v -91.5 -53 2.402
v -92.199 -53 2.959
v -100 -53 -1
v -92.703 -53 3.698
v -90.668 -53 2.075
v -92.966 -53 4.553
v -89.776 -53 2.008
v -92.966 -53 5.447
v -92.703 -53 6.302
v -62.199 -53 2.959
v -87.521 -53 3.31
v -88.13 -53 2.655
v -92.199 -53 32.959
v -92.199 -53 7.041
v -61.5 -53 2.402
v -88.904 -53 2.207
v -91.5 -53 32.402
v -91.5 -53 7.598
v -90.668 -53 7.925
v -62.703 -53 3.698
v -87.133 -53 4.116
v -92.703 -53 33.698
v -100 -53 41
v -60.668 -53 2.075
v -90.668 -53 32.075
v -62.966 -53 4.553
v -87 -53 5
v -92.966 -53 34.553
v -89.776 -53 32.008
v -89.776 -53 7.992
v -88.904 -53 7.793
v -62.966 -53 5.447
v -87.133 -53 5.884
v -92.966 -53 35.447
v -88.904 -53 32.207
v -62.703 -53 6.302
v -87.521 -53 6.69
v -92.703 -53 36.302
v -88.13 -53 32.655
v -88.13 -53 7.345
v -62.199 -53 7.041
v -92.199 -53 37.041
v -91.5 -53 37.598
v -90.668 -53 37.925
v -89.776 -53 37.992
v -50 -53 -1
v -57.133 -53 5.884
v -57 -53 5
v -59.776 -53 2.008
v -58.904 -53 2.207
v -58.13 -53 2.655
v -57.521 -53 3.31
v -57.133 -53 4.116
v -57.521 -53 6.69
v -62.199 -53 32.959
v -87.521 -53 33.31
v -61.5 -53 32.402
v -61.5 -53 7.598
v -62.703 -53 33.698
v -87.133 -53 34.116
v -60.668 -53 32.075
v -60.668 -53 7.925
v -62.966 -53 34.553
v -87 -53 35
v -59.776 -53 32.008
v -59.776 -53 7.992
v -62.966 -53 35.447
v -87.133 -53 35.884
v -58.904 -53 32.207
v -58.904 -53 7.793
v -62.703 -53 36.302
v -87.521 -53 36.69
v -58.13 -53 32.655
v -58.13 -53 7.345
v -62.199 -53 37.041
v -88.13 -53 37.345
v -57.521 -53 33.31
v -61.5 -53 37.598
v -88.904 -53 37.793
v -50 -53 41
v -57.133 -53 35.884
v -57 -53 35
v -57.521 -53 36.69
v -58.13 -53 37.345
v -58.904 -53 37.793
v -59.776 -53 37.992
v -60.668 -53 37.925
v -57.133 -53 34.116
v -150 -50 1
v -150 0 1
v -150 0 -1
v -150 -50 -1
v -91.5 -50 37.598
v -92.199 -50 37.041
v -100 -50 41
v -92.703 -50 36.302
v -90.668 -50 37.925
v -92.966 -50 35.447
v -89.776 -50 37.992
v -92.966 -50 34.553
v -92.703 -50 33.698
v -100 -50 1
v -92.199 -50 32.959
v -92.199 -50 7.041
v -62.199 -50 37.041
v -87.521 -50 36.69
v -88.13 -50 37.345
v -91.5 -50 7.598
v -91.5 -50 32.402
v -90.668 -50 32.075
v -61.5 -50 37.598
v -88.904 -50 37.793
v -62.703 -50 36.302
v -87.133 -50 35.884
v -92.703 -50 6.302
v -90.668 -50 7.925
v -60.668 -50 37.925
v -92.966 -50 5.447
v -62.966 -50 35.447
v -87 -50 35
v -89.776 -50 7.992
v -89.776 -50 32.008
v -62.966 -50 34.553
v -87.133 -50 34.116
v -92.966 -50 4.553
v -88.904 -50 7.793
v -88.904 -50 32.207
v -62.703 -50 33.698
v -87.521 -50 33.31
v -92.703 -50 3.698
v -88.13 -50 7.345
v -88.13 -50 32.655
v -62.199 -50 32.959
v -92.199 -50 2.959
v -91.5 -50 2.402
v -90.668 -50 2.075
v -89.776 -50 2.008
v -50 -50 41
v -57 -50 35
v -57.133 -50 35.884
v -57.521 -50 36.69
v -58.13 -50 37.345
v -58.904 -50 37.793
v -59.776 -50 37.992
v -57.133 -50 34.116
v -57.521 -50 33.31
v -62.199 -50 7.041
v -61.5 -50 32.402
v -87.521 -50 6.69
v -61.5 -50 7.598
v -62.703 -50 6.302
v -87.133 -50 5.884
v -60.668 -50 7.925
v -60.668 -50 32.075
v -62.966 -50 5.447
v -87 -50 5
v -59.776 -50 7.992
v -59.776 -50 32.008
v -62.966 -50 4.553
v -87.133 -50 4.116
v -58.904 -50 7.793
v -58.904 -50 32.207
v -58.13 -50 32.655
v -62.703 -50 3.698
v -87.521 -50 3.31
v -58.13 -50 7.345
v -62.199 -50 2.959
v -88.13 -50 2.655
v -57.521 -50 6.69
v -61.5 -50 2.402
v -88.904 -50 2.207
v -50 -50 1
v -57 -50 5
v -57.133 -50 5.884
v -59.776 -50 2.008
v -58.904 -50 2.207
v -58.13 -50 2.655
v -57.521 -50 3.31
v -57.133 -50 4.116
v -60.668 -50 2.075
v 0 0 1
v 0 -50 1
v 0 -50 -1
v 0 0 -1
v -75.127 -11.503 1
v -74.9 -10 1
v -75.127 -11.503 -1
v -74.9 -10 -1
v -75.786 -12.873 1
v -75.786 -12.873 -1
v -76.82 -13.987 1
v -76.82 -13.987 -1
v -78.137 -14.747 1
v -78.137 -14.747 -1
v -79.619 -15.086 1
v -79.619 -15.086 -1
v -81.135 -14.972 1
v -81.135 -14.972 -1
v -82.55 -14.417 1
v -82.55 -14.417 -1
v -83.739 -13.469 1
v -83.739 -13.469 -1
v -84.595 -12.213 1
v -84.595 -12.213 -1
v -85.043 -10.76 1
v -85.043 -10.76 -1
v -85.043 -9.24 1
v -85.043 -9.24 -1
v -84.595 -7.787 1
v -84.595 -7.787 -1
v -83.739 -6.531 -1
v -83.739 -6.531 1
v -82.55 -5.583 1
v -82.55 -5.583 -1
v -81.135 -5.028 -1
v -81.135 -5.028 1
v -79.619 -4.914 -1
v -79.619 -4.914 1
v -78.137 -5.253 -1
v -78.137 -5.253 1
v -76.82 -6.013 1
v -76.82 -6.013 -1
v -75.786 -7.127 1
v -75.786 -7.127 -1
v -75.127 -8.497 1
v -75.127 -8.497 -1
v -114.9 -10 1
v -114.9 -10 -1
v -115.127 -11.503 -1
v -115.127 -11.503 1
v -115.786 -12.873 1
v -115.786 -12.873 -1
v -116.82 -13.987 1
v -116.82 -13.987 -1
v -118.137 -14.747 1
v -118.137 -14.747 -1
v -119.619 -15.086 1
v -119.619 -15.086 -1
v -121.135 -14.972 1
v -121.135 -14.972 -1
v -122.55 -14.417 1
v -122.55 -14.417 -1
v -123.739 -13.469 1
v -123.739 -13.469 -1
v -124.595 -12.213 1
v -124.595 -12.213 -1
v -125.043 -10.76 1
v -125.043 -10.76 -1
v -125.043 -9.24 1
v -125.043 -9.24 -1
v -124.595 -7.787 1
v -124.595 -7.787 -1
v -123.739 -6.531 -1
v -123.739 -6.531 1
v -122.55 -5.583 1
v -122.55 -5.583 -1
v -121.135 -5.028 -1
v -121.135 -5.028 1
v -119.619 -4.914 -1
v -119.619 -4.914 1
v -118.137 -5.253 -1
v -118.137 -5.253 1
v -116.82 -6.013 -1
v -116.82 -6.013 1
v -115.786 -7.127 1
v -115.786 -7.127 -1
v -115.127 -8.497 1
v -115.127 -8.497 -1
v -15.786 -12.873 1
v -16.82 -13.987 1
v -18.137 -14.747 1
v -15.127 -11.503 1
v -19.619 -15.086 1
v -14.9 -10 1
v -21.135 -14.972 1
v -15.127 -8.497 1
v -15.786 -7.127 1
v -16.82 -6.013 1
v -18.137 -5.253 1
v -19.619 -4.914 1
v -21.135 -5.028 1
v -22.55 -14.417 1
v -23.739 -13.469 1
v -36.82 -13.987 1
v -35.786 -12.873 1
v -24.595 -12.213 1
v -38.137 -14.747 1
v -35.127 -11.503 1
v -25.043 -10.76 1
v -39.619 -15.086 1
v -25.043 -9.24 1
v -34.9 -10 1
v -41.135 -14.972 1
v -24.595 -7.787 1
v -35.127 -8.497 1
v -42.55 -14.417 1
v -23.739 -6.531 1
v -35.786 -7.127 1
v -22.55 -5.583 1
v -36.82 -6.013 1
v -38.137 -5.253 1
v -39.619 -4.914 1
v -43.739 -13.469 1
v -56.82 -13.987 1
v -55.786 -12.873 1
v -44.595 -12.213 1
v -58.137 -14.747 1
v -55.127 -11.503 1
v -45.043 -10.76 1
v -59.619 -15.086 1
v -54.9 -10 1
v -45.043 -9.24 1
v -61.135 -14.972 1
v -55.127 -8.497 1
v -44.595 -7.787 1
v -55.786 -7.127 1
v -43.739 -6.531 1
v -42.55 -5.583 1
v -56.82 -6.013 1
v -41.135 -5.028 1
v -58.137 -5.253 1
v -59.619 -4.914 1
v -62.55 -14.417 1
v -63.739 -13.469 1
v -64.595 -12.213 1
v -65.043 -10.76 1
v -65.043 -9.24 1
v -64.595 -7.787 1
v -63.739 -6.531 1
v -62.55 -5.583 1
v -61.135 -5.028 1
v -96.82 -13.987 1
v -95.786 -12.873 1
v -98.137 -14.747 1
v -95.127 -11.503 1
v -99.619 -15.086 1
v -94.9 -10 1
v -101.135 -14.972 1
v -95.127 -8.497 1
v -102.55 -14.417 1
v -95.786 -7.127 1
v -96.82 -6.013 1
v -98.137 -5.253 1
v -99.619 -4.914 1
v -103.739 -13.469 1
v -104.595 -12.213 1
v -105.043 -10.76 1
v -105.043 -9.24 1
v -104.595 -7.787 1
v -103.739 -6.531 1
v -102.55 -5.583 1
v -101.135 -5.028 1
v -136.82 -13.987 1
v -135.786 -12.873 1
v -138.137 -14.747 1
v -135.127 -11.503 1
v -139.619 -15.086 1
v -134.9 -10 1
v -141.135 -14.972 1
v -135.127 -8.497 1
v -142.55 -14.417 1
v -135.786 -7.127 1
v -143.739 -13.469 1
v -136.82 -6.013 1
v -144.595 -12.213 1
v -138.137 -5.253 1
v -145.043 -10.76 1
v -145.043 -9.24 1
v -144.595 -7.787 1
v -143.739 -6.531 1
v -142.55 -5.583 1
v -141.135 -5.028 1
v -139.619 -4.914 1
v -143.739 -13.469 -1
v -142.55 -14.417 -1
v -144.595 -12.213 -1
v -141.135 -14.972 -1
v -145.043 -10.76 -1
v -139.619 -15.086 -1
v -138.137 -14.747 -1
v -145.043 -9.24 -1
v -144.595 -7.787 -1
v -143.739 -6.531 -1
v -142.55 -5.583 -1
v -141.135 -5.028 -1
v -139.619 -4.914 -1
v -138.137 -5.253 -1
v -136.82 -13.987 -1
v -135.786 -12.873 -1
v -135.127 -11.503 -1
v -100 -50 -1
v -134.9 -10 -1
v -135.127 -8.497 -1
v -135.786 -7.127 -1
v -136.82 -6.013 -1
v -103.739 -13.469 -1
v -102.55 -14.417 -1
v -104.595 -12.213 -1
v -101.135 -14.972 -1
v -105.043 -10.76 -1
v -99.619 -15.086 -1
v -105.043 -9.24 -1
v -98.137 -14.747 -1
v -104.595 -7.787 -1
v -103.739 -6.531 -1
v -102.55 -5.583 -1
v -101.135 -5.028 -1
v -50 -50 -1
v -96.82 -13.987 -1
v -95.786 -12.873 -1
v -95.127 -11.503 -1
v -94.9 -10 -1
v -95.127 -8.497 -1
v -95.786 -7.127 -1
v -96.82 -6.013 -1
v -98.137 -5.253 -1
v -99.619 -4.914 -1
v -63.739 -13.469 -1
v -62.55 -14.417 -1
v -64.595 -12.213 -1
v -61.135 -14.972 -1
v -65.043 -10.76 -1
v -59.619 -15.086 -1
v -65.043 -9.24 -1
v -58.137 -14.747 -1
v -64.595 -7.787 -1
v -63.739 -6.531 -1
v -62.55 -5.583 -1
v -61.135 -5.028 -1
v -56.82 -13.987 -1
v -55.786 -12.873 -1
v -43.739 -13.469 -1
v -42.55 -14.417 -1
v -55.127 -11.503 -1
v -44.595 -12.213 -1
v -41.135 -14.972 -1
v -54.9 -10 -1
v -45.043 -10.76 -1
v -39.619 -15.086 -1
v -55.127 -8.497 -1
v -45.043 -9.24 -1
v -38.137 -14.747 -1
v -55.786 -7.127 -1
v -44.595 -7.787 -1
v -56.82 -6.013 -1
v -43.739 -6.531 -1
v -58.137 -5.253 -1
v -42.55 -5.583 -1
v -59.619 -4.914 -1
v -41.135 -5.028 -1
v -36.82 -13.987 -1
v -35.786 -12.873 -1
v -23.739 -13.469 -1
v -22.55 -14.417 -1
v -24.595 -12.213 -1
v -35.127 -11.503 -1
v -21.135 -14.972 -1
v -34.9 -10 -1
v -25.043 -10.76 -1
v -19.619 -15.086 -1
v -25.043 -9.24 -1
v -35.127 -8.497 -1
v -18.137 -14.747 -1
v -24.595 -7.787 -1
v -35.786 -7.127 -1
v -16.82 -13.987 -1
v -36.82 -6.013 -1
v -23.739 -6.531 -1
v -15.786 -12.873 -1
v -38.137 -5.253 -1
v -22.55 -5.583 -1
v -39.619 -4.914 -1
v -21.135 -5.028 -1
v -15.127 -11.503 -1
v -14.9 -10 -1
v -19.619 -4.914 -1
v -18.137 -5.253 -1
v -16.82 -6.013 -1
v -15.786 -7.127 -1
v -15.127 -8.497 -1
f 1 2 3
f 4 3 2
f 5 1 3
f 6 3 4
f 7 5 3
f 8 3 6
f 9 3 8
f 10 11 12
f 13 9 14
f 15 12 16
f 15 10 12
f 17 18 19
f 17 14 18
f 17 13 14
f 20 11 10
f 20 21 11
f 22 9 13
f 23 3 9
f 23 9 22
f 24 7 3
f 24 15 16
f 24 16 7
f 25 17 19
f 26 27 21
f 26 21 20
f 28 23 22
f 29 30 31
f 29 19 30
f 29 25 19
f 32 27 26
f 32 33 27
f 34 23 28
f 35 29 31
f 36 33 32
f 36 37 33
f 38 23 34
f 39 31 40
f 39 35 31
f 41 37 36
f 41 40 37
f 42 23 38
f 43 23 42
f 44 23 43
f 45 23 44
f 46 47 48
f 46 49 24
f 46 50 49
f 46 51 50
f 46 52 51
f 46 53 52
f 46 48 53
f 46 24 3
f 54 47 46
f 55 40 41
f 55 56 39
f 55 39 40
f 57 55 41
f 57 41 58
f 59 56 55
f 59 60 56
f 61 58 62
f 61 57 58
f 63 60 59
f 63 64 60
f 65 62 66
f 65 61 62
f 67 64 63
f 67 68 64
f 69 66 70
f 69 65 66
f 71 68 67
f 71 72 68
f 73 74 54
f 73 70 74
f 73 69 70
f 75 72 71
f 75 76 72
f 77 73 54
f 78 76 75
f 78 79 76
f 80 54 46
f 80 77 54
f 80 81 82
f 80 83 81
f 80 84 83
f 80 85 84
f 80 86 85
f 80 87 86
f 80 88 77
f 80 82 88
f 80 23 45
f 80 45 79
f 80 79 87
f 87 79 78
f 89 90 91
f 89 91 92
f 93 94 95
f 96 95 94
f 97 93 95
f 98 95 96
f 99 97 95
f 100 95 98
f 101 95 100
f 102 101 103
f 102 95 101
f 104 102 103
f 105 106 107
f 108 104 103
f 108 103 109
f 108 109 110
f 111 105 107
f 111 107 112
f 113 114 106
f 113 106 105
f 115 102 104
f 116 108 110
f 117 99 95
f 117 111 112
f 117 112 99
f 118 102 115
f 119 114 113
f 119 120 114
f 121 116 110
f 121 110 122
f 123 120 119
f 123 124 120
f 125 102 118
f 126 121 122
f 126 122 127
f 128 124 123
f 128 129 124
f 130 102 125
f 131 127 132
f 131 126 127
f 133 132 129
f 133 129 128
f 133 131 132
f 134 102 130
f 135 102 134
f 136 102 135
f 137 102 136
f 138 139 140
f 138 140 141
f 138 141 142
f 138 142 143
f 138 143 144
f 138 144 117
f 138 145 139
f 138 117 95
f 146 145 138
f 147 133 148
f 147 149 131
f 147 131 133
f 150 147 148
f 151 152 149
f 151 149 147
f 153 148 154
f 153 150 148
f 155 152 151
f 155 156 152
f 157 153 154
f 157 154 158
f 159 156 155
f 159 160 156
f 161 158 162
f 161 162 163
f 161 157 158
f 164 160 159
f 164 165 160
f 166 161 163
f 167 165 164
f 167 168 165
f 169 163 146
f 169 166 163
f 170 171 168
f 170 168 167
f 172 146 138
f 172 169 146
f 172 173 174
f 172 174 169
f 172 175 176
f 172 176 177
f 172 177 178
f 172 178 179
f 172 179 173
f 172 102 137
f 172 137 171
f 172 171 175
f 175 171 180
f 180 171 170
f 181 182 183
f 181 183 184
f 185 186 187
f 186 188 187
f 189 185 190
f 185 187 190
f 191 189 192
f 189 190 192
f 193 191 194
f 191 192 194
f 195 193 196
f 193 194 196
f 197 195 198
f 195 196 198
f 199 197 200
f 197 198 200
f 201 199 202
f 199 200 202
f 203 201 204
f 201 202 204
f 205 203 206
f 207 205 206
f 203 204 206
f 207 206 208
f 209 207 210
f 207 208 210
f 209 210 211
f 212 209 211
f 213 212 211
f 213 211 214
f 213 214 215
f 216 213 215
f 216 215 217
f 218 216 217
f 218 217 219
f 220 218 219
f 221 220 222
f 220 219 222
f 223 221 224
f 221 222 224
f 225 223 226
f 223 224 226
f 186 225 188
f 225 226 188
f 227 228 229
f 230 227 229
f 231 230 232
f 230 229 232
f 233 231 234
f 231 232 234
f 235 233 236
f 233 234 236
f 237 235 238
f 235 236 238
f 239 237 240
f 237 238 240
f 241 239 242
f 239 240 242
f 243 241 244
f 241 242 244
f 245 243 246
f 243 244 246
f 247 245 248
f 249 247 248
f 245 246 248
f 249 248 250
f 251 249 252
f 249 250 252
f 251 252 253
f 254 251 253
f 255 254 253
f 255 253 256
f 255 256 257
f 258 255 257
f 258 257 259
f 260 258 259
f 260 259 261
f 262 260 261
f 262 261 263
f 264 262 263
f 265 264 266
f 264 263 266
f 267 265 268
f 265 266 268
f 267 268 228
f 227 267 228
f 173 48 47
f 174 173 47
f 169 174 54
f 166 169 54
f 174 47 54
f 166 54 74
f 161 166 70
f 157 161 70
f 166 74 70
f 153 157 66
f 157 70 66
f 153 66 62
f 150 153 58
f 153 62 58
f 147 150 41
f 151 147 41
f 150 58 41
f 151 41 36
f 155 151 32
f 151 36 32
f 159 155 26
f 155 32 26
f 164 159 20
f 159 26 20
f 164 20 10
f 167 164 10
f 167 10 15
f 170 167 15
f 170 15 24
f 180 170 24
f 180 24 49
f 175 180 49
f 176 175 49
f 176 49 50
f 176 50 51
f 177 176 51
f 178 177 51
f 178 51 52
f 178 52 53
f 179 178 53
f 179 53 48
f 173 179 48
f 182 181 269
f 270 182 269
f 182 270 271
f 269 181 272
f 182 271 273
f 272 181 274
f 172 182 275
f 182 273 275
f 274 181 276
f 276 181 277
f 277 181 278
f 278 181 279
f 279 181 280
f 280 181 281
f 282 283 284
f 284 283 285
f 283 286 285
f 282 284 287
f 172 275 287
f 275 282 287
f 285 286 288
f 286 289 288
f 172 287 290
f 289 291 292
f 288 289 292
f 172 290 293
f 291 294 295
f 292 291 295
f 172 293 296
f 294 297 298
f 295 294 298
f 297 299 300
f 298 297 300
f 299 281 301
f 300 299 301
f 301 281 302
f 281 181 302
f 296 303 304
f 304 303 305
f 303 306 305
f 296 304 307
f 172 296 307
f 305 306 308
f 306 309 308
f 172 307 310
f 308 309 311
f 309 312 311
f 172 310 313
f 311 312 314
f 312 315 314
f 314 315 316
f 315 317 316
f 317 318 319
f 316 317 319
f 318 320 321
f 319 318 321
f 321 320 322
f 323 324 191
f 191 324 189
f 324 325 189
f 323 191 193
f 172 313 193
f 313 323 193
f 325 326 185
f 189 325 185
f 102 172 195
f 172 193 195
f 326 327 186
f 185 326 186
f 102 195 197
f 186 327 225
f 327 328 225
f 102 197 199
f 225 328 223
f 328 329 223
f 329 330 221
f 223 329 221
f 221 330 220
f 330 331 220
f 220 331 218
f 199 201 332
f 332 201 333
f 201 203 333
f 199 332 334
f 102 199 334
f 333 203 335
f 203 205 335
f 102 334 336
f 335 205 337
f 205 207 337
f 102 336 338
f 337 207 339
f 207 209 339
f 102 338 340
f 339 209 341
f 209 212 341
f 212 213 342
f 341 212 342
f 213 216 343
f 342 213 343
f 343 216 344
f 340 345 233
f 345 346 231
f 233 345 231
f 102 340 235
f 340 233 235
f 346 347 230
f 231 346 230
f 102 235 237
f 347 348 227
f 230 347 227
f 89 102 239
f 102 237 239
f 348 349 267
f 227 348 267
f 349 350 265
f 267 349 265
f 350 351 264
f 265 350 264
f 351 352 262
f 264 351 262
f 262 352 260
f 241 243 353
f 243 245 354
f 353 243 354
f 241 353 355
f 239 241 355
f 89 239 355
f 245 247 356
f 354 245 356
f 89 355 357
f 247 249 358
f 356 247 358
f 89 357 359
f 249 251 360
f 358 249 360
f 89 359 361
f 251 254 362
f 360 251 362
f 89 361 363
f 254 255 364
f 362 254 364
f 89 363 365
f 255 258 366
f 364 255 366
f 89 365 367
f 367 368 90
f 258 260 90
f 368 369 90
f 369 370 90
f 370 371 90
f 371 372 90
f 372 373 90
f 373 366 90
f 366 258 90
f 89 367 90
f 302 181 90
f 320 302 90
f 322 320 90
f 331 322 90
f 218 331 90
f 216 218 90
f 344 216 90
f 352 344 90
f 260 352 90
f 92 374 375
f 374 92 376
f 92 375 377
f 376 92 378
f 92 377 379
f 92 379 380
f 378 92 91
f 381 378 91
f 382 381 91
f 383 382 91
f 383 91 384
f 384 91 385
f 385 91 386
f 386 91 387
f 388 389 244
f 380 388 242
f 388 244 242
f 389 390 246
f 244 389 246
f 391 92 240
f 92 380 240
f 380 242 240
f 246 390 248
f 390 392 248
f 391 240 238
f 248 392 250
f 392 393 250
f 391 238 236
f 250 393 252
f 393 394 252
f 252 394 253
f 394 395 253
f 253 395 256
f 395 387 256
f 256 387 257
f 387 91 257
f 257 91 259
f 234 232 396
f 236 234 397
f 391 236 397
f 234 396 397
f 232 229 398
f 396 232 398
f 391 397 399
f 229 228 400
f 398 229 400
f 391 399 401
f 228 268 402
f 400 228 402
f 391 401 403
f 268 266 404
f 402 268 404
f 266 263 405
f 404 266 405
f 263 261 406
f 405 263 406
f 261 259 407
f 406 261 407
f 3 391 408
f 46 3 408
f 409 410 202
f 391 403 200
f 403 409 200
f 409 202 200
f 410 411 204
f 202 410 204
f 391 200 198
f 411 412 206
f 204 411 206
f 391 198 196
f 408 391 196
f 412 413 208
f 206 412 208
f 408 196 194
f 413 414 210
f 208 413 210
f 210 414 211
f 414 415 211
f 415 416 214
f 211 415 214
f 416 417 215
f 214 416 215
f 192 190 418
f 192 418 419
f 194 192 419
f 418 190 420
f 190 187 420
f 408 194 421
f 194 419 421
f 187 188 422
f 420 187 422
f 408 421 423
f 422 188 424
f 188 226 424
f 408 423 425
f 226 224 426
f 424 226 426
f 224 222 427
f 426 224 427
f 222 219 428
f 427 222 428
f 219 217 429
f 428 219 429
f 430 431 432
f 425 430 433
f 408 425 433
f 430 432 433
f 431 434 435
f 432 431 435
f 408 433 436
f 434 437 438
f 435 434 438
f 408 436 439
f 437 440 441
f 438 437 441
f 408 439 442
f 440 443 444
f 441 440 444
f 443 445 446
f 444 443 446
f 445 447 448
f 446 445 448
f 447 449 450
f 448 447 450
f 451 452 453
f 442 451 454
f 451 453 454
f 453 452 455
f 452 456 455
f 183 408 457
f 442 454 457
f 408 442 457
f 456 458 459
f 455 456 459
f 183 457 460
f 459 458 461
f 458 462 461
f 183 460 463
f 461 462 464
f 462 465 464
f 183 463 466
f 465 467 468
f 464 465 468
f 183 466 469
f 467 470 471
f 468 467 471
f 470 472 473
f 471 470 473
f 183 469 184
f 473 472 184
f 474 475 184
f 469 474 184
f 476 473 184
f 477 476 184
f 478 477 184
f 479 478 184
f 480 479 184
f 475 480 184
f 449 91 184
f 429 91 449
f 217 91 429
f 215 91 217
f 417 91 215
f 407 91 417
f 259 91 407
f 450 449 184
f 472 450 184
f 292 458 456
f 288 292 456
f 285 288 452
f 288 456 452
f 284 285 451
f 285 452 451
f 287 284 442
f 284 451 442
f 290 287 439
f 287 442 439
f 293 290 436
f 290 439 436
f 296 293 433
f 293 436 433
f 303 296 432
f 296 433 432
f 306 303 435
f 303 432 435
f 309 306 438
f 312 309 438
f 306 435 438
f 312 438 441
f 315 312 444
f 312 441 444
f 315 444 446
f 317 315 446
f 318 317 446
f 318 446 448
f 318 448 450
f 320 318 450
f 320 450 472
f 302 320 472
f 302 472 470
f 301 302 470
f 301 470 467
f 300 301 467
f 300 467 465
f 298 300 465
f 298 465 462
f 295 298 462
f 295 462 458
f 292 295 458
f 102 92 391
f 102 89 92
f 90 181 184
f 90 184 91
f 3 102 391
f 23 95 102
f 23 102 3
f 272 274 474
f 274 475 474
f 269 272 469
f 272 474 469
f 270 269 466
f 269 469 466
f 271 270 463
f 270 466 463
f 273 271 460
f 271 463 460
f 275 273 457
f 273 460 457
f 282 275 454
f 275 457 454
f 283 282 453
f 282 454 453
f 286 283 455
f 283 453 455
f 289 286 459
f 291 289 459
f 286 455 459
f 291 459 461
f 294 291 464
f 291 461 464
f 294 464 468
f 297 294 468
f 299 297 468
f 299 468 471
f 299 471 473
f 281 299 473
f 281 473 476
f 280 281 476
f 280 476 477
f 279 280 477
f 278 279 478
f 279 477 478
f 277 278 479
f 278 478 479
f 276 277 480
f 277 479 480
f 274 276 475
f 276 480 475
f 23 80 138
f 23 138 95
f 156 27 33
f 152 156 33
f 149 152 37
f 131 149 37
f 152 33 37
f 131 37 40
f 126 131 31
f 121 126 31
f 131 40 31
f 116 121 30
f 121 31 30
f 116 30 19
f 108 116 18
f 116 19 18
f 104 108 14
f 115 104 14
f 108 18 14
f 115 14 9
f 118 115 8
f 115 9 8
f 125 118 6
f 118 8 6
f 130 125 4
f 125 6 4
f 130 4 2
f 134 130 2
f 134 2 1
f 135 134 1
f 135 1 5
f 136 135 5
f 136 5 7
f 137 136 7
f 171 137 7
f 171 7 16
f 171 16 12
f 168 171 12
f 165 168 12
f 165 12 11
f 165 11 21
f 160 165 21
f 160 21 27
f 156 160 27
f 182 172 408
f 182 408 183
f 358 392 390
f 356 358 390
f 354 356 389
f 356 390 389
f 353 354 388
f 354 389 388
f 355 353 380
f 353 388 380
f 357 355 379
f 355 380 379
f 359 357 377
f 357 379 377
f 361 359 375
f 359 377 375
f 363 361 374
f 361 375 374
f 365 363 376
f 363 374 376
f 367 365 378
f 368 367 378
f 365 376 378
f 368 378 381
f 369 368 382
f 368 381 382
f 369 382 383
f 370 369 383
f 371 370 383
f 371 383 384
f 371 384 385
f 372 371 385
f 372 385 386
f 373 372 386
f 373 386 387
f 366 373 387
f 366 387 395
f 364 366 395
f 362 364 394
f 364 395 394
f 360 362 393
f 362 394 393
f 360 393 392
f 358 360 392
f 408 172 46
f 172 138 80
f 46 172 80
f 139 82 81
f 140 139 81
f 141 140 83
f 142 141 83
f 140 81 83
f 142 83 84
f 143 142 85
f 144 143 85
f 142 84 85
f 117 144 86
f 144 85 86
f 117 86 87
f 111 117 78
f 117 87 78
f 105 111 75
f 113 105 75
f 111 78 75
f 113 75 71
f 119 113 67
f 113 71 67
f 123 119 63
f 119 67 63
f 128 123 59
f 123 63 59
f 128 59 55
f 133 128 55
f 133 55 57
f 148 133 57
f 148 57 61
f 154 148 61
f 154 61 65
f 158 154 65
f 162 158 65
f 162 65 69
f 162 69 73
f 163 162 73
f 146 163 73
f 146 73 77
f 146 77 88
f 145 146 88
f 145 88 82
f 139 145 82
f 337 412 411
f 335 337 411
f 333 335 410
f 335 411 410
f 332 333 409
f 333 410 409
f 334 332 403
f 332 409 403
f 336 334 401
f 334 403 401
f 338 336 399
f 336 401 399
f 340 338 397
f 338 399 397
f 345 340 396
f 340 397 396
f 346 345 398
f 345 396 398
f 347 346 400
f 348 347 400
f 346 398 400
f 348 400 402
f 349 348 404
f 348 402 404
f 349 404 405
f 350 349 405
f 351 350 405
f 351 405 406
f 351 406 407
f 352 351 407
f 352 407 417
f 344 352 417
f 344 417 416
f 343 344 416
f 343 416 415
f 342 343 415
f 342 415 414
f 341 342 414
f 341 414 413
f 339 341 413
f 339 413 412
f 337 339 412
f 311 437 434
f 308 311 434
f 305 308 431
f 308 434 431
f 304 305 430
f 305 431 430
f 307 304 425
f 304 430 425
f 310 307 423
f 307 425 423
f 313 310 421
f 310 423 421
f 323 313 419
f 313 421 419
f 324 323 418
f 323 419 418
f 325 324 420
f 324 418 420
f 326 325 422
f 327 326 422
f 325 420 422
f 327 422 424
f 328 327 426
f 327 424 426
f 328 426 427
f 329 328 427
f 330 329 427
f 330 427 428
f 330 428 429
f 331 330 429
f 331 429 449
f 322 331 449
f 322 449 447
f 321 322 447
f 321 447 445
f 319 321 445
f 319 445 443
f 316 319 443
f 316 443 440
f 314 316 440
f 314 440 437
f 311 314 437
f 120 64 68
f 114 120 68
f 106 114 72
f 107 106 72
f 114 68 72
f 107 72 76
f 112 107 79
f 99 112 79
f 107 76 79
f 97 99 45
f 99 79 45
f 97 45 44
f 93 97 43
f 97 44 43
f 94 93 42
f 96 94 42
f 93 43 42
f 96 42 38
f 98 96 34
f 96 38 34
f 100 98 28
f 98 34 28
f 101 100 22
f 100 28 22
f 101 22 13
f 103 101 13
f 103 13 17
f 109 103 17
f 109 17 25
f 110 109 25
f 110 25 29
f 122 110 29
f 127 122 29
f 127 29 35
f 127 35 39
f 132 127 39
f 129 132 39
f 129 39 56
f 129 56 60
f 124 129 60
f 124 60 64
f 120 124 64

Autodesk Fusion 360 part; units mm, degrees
sketch "Sketch1" plane through (0, 0, 0) normal (0, 0, 1) x (1, 0, 0)
  line L0 (0, 0) -> (-150, 0)
  line L1 (-150, 0) -> (-150, -50)
  line L2 (-150, -50) -> (0, -50)
  line L3 (0, -50) -> (0, 0)
  dimension "d1" = 150
extrude "Extrude1" add sketch "Sketch1" along normal blind 1
sketch "Sketch2" plane through (0, -50, 0) normal (0, -1, 0) x (1, 0, 0)
  line L0 (-150, 0) -> (0, 0)
  line L1 (0, 0) -> (0, 1)
  line L2 (0, 1) -> (-150, 1)
  line L3 (-150, 1) -> (-150, 0)
  line L4 (-100, 0) -> (-50, 0)
  line L5 (-50, 0) -> (-50, 1)
  line L6 (-50, 1) -> (-100, 1)
  line L7 (-100, 1) -> (-100, 0)
  dimension "d4" = 50
extrude "Extrude2" add sketch "Sketch2" along normal blind 1 contours L0 L2 L4 L5 L6 L7
extrude "Extrude3" add 1 faces at (-83.3333, -51, 0.6667) along direction (0, -1, 0) blind 2
sketch "Sketch3" plane through (0, 0, 1) normal (0, 0, 1) x (-1, 0, 0)
  line L0 (0, 50) -> (0, 0)
  line L1 (0, 0) -> (150, 0)
  line L2 (150, 0) -> (150, 50)
  line L3 (150, 50) -> (100, 50)
  line L4 (100, 50) -> (100, 53)
  line L5 (100, 53) -> (50, 53)
  line L6 (50, 53) -> (50, 50)
  line L7 (50, 50) -> (0, 50)
  line L8 (100, 50) -> (50, 50)
  line L9 (50, 50) -> (50, 53)
  line L10 (50, 53) -> (100, 53)
  line L11 (100, 53) -> (100, 50)
extrude "Extrude4" add sketch "Sketch3" along normal blind 40 contours L4 L5 L6 L8 L9 L10 L11
extrude "Extrude5" add 1 faces at (-83.3333, -16.6667, 0) along direction (0, 0, -1) blind 1
sketch "Sketch4" plane through (0, -53, 0) normal (0, -1, 0) x (1, 0, 0)
  line L0 (-100, 41) -> (-100, -1)
  line L1 (-100, -1) -> (-50, -1)
  line L2 (-50, -1) -> (-50, 41)
  line L3 (-50, 41) -> (-100, 41)
  circle A0 centre (-60, 35) radius 3
  circle A1 centre (-60, 5) radius 3
  dimension "d13" = 6
  dimension "d14" = 6
sketch "Sketch5" plane through (0, -53, 0) normal (0, -1, 0) x (1, 0, 0)
  circle A0 centre (-90, 35) radius 3
  circle A1 centre (-90, 5) radius 3
  dimension "d15" = 6
  dimension "d16" = 6
extrude "Extrude6" cut sketch "Sketch4" sketch "Sketch5" against normal blind 15 contours A0 | A1 of sketch 2
sketch "Sketch6" plane through (0, 0, -1) normal (0, 0, -1) x (1, 0, 0)
  line L0 (0, 0) -> (0, 50)
  line L1 (0, 50) -> (-50, 50)
  line L2 (-50, 50) -> (-50, 53)
  line L3 (-50, 53) -> (-100, 53)
  line L4 (-100, 53) -> (-100, 50)
  line L5 (-100, 50) -> (-150, 50)
  line L6 (-150, 50) -> (-150, 0)
  line L7 (-150, 0) -> (0, 0)
  circle A0 centre (-140, 10) radius 5.1
  circle A1 centre (-120, 10) radius 5.1
  circle A2 centre (-100, 10) radius 5.1
  circle A3 centre (-80, 10) radius 5.1
  circle A4 centre (-60, 10) radius 5.1
  circle A5 centre (-40, 10) radius 5.1
  circle A6 centre (-20, 10) radius 5.1
  dimension "d19" = 10.2
  dimension "d20" = 10.2
  dimension "d21" = 10.2
  dimension "d22" = 10.2
  dimension "d23" = 10.2
  dimension "d24" = 10.2
  dimension "d25" = 10.2
extrude "Extrude7" cut sketch "Sketch6" against normal blind 10 contours A0 | A1 | A2 | A3 | A4 | A5 | A6
